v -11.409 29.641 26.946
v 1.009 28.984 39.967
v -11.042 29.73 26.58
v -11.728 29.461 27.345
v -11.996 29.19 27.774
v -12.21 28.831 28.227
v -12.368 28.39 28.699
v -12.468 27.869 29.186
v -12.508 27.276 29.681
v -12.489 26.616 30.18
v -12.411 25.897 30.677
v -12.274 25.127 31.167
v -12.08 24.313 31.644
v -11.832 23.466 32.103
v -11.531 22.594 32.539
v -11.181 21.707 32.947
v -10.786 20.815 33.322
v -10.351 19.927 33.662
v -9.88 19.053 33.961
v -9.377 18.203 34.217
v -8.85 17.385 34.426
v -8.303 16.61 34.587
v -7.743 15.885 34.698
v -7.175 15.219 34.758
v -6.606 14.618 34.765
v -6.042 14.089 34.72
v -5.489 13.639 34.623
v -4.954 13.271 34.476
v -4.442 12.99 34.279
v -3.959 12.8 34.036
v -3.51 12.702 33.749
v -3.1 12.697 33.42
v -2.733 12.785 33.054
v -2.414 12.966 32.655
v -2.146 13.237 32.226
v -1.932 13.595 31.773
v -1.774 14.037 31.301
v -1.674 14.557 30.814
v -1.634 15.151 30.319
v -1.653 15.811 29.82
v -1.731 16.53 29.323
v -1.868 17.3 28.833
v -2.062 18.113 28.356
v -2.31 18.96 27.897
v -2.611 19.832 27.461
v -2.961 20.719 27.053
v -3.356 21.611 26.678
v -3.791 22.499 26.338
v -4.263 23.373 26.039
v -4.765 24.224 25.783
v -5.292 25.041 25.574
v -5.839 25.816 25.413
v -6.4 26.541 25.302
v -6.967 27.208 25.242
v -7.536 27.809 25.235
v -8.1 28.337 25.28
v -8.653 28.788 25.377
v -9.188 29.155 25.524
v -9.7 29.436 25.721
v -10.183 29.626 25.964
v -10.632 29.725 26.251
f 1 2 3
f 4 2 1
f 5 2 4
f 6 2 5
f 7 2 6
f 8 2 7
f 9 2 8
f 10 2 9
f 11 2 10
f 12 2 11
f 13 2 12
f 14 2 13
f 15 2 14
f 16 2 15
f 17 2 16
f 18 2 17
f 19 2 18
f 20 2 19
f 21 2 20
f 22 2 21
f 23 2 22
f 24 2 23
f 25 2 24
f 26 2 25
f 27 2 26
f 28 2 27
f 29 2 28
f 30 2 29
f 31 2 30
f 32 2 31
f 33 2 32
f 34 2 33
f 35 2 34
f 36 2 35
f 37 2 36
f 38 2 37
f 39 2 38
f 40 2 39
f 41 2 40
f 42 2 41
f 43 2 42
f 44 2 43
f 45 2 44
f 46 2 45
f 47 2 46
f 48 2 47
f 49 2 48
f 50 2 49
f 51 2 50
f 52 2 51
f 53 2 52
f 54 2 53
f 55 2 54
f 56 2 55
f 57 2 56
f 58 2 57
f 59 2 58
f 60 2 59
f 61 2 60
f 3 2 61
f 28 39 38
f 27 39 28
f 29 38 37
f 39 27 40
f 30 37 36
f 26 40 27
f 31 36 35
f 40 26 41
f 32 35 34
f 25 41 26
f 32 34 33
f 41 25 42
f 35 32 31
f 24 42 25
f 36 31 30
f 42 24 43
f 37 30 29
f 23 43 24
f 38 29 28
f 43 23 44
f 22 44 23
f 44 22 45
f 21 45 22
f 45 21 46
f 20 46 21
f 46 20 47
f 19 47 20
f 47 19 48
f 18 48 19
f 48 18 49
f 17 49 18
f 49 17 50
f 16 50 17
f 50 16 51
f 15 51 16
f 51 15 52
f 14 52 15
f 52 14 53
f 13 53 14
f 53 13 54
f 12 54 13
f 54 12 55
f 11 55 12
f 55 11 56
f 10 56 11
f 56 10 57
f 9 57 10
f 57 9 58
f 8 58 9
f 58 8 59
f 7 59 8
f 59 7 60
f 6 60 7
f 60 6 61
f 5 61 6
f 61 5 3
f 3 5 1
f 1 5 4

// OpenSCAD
// file: ../utils/core/clip.scad
//
// NopSCADlib Copyright Chris Palmer 2018
// nop.head@gmail.com
// hydraraptor.blogspot.com
//
// This file is part of NopSCADlib.
//
// NopSCADlib is free software: you can redistribute it and/or modify it under the terms of the
// GNU General Public License as published by the Free Software Foundation, either version 3 of
// the License, or (at your option) any later version.
//
// NopSCADlib is distributed in the hope that it will be useful, but WITHOUT ANY WARRANTY;
// without even the implied warranty of MERCHANTABILITY or FITNESS FOR A PARTICULAR PURPOSE.
// See the GNU General Public License for more details.
//
// You should have received a copy of the GNU General Public License along with NopSCADlib.
// If not, see <https://www.gnu.org/licenses/>.
//

//
//! Construct arbirarily large box to partition 3D space and clip objects, useful for creating cross sections to see the inside when debugging.
//!
//! Original version by Doug Moen on the OpenSCAD forum
//
//
module box(xmin, ymin, zmin, xmax, ymax, zmax) //! Construct a box given its bounds
    polyhedron(
        [[xmin, ymin, zmin],  // 0
         [xmin, ymin, zmax],  // 1
         [xmin, ymax, zmin],  // 2
         [xmin, ymax, zmax],  // 3
         [xmax, ymin, zmin],  // 4
         [xmax, ymin, zmax],  // 5
         [xmax, ymax, zmin],  // 6
         [xmax, ymax, zmax]], // 7
        [[7,5,1,3],  // top
         [2,0,4,6],  // bottom
         [5,4,0,1],  // front
         [3,2,6,7],  // back
         [5,7,6,4],  // right
         [0,2,3,1]]  // left
    );

module clip(xmin = -inf, ymin = -inf, zmin = -inf, xmax = inf, ymax = inf, zmax = inf) //! Clip child to specified boundaries
    render() intersection() {
        children();

        box(xmin, ymin, zmin, xmax, ymax, zmax);
    }
// file: ../utils/core/rounded_rectangle.scad
//
// NopSCADlib Copyright Chris Palmer 2018
// nop.head@gmail.com
// hydraraptor.blogspot.com
//
// This file is part of NopSCADlib.
//
// NopSCADlib is free software: you can redistribute it and/or modify it under the terms of the
// GNU General Public License as published by the Free Software Foundation, either version 3 of
// the License, or (at your option) any later version.
//
// NopSCADlib is distributed in the hope that it will be useful, but WITHOUT ANY WARRANTY;
// without even the implied warranty of MERCHANTABILITY or FITNESS FOR A PARTICULAR PURPOSE.
// See the GNU General Public License for more details.
//
// You should have received a copy of the GNU General Public License along with NopSCADlib.
// If not, see <https://www.gnu.org/licenses/>.
//

//
//! Rectangle with rounded corners.
//
module rounded_square(size, r, center = true) //! Like ```square()``` but with with rounded corners
{
    $fn = r2sides4n(r);
    offset(r) offset(-r) square(size, center = center);
}

module rounded_rectangle(size, r, center = true, xy_center = true) //! Like ```cube()``` but corners rounded in XY plane and separate centre options for xy and z.
{
    linear_extrude(height = size[2], center = center)
        rounded_square([size[0], size[1]], r, xy_center);
}
// file: ../utils/core/teardrops.scad
//
// NopSCADlib Copyright Chris Palmer 2018
// nop.head@gmail.com
// hydraraptor.blogspot.com
//
// This file is part of NopSCADlib.
//
// NopSCADlib is free software: you can redistribute it and/or modify it under the terms of the
// GNU General Public License as published by the Free Software Foundation, either version 3 of
// the License, or (at your option) any later version.
//
// NopSCADlib is distributed in the hope that it will be useful, but WITHOUT ANY WARRANTY;
// without even the implied warranty of MERCHANTABILITY or FITNESS FOR A PARTICULAR PURPOSE.
// See the GNU General Public License for more details.
//
// You should have received a copy of the GNU General Public License along with NopSCADlib.
// If not, see <https://www.gnu.org/licenses/>.
//

//
//! For making horizontal holes that don't need support material.
//! Small holes can get away without it, but they print better with truncated teardrops.
//
module teardrop(h, r, center = true, truncate = true) //! For making horizontal holes that don't need support material, set ```truncate = false``` to make traditional RepRap teardrops that don't even need bridging
    render(convexity = 5)
        extrude_if(h, center)
           hull() {
                circle4n(r);

                if(truncate)
                    translate([0, r / 2])
                        square([2 * r * (sqrt(2) - 1), r], center = true);
                else
                    polygon([[0, 0], [eps, 0], [0, r * sqrt(2)]]);
            }

module semi_teardrop(h, r, d = undef, center = true) //! A semi teardrop in the positive Y domain
    render(convexity = 5)
        extrude_if(h, center)
            intersection() {
                R = is_undef(d) ? r : d / 2;
                teardrop(r = R, h = 0);

                sq = R + 1;
                translate([-sq, 0])
                    square([2 * sq, sq]);
            }

module teardrop_plus(h, r, center = true, truncate = true) //! Slightly bigger teardrop to allow for the 3D printing staircase effect
    teardrop(h, r + layer_height / 4, center, truncate);

module tearslot(h, r, w, center = true) //! A horizontal slot that doesn't need support material
    extrude_if(h, center)
        hull() {
            translate([-w/2,0,0]) teardrop(r = r, h = 0);
            translate([ w/2,0,0]) teardrop(r = r, h = 0);
        }

module vertical_tearslot(h, r, l, center = true) //! A vertical slot that doesn't need support material
    extrude_if(h, center)
        hull() {
            translate([0,  l / 2]) teardrop(0, r, true);
            translate([0, -l / 2])
                circle4n(r);
        }
// file: ../utils/core/polyholes.scad
//
// NopSCADlib Copyright Chris Palmer 2018
// nop.head@gmail.com
// hydraraptor.blogspot.com
//
// This file is part of NopSCADlib.
//
// NopSCADlib is free software: you can redistribute it and/or modify it under the terms of the
// GNU General Public License as published by the Free Software Foundation, either version 3 of
// the License, or (at your option) any later version.
//
// NopSCADlib is distributed in the hope that it will be useful, but WITHOUT ANY WARRANTY;
// without even the implied warranty of MERCHANTABILITY or FITNESS FOR A PARTICULAR PURPOSE.
// See the GNU General Public License for more details.
//
// You should have received a copy of the GNU General Public License along with NopSCADlib.
// If not, see <https://www.gnu.org/licenses/>.
//

//
//! A method of making 3D printed holes come out the right size regardless of the printer, providing
//! it gets the linear dimensions right. See <https://hydraraptor.blogspot.com/2011/02/polyholes.html>
//!
//! The module provides `poly_circle()`, `poly_cylinder()` and `poly_ring()` that is useful for making printed washers and pillars.
//
function sides(r) = max(round(4 * r), 3);                                       //! Optimium number of sides for specified radius
function corrected_radius(r, n = 0)   = r / cos(180 / (n ? n : sides(r)));      //! Adjusted radius to make flats lie on the circle
function corrected_diameter(d, n = 0) = d / cos(180 / (n ? n : sides(d / 2)));  //! Adjusted diameter to make flats lie on the circle

module poly_circle(r, sides = 0) { //! Make a circle adjusted to print the correct size
    n = sides ? sides : sides(r);
    circle(r = corrected_radius(r,n), $fn = n);
}

module poly_cylinder(r, h, center = false, sides = 0) //! Make a cylinder adjusted to print the correct size
    extrude_if(h, center)
        poly_circle(r, sides);

module poly_ring(or, ir) { //! Make a 2D ring adjusted to have the correct internal radius
    cir = corrected_radius(ir);
    filaments = (or - cir) / extrusion_width;
    if(filaments > 3 + eps)
        difference() {
            circle(or);

            poly_circle(ir);
        }
    else
        if(filaments >= 2)
            difference() {
                offset(or - cir)
                    poly_circle(ir);

                poly_circle(ir);
            }
            else
                difference() {
                    poly_circle(or);

                    offset(-squeezed_wall)
                        poly_circle(or);
                }
}

module poly_tube(or, ir, h, center = false) //! Make a tube adjusted to have the correct internal radius
    extrude_if(h, center)
        poly_ring(or, ir);

module drill(r, h = 100) //! Make a cylinder for drilling holes suitable for CNC routing, set h = 0 for circle
    extrude_if(h)
        circle(r = corrected_radius(r, r2sides(r)));
//
// Horizontal slot
//
module slot(r, l, h = 100) //! Make a horizontal slot suitable for CNC routing, set h = 0 for 2D version
    extrude_if(h)
        hull() {
            translate([l / 2,0])
                drill(r, 0);

            translate([-l / 2,0])
                drill(r, 0);
        }
// file: ../utils/core/bom.scad
//
// NopSCADlib Copyright Chris Palmer 2018
// nop.head@gmail.com
// hydraraptor.blogspot.com
//
// This file is part of NopSCADlib.
//
// NopSCADlib is free software: you can redistribute it and/or modify it under the terms of the
// GNU General Public License as published by the Free Software Foundation, either version 3 of
// the License, or (at your option) any later version.
//
// NopSCADlib is distributed in the hope that it will be useful, but WITHOUT ANY WARRANTY;
// without even the implied warranty of MERCHANTABILITY or FITNESS FOR A PARTICULAR PURPOSE.
// See the GNU General Public License for more details.
//
// You should have received a copy of the GNU General Public License along with NopSCADlib.
// If not, see <https://www.gnu.org/licenses/>.
//

//
//! Bill Of Materials generation via echo and the ```bom.py``` script. Also handles exploded assembly views and posing. Assembly instructions can precede the module
//! definition that makes the assembly.
//!
//! The example below shows how to define a vitamin and incorporate it into an assembly with sub-assemblies and make an exploded view. The resulting flat BOM is shown but
//! heirachical BOMs are also generated for real projects.
//
function bom_mode(n = 1) = $_bom >= n && (is_undef($on_bom) || $on_bom);  //! Current BOM mode, 0 = none, 1 = printed and routed parts and assemblies, 2 includes vitamins as well
function exploded() = is_undef($exploded_parent) ? $exploded : 0;   //! Returns the value of ```$exploded``` if it is defined, else ```0```
function show_supports() = !$preview || exploded();                 //! True if printed support material should be shown

module no_explode() let($exploded_parent = true) children();        //! Prevent children being exploded
module no_pose() let($posed = true) children();                     //! Force children not to be posed even if parent is

module explode(d, explode_children = false, offset = [0,0,0]) {     //! Explode children by specified Z distance or vector ```d```, option to explode grand children
    v = is_list(d) ? d : [0, 0, d];
    o = is_list(offset) ? offset : [0, 0, offset];
    if($exploded && is_undef($exploded_parent) && norm(v)) {
        translate(o)                                                // Draw the line first in case the child is transparent
            color("yellow") hull() {
                sphere(0.2);

                translate(v * $exploded)
                    sphere(0.2);
            }

        translate(v * $exploded)
            let($exploded_parent = explode_children ? undef : true)
                children();
    }
    else
        children();
}

module pose(a = [55, 0, 25], t = [0, 0, 0], exploded = undef)       //! Pose an STL or assembly for rendering to png by specifying rotation ```a``` and translation ```t```, ```exploded = true for``` just the exploded view or ```false``` for unexploded only.
    if(is_undef($pose) || !is_undef($posed) || (!is_undef(exploded) && exploded != !!exploded()))
        children();
    else
        let($posed = true) // only pose the top level
            rotate([55, 0, 25])
                rotate([-a.x, 0, 0])
                    rotate([0, -a.y, 0])
                        rotate([0, 0, -a.z])
                            translate(-t)
                                children();

module pose_hflip(exploded = undef)       //! Pose an STL or assembly for rendering to png by flipping around the Y axis, ```exploded = true for``` just the exploded view or ```false``` for unexploded only.
    if(is_undef($pose) || !is_undef($posed) || (!is_undef(exploded) && exploded != !!exploded()))
        children();
    else
        let($posed = true) // only pose the top level
            hflip()
                children();

module pose_vflip(exploded = undef)       //! Pose an STL or assembly for rendering to png by flipping around the X axis, ```exploded = true for``` just the exploded view or ```false``` for unexploded only.
    if(is_undef($pose) || !is_undef($posed) || (!is_undef(exploded) && exploded != !!exploded()))
        children();
    else
        let($posed = true) // only pose the top level
            vflip()
                children();


module assembly(name) {                 //! Name an assembly that will appear on the BOM, there needs to a module named ```<name>_assembly``` to make it
    if(bom_mode())
        echo(str("~", name, "_assembly{"));

    no_pose()
        if(is_undef($child_assembly))
            let($child_assembly = true)
                children();
        else
            no_explode()
                children();

    if(bom_mode())
        echo(str("~}", name, "_assembly"));
}

module stl(name) {                      //! Name an stl that will appear on the BOM, there needs to a module named ```<name>_stl``` to make it
    if(bom_mode())
        echo(str("~", name, ".stl"));
}

module dxf(name) {                      //! Name a dxf that will appear on the BOM, there needs to a module named ```<name>_dxf``` to make it
    if(bom_mode())
        echo(str("~", name, ".dxf"));
}

function value_string(value) = is_string(value) ? str("\"", value, "\"") : str(value); //! Convert ```value``` to a string or quote it if it is already a string

function arg(value, default, name = "") =   //! Create string for arg if not default, helper for ```vitamin()```
    value == default ? ""
                     : name ? str(", ", name, " = ", value_string(value))
                            : str(", ", value_string(value));

module vitamin(description) {                //! Describe a vitamin for the BOM entry and precede it with a module call that creates it, eg. "wigit(42): Type 42 widget"
    if(bom_mode(2))
        echo(str("~", description, !is_undef($hidden) ? " - not shown" : ""));
}

module not_on_bom(on = false)               //! Specify the following child parts are not on the BOM, for example when they are on a PCB that comes assembled
    let($on_bom = on)
        children();

module hidden()                             //! Make item invisible, except on the BOM
    scale(1 / sqr(1024))
        let($hidden = true)
            children();
// file: ../utils/core/sphere.scad
//
// NopSCADlib Copyright Chris Palmer 2018
// nop.head@gmail.com
// hydraraptor.blogspot.com
//
// This file is part of NopSCADlib.
//
// NopSCADlib is free software: you can redistribute it and/or modify it under the terms of the
// GNU General Public License as published by the Free Software Foundation, either version 3 of
// the License, or (at your option) any later version.
//
// NopSCADlib is distributed in the hope that it will be useful, but WITHOUT ANY WARRANTY;
// without even the implied warranty of MERCHANTABILITY or FITNESS FOR A PARTICULAR PURPOSE.
// See the GNU General Public License for more details.
//
// You should have received a copy of the GNU General Public License along with NopSCADlib.
// If not, see <https://www.gnu.org/licenses/>.
//

//! Redefines `sphere()` to always have a vertex on all six half axes I.e. vertices at the poles and the equator and `$fn` a multiple of four.
//! This ensures `hull` and `minkowski` results have the correct dimensions when spheres are placed at the corners.

module sphere(r = 1, d = undef) {                   //! Override ```sphere``` so that has vertices on all three axes. Has the advantage of giving correct dimensions when hulled
    R = is_undef(d) ? r : d / 2;
    rotate_extrude($fn = r2sides4n(R))
        rotate(-90)
            semi_circle(R);
}
// file: ../utils/core/global.scad
//
// NopSCADlib Copyright Chris Palmer 2018
// nop.head@gmail.com
// hydraraptor.blogspot.com
//
// This file is part of NopSCADlib.
//
// NopSCADlib is free software: you can redistribute it and/or modify it under the terms of the
// GNU General Public License as published by the Free Software Foundation, either version 3 of
// the License, or (at your option) any later version.
//
// NopSCADlib is distributed in the hope that it will be useful, but WITHOUT ANY WARRANTY;
// without even the implied warranty of MERCHANTABILITY or FITNESS FOR A PARTICULAR PURPOSE.
// See the GNU General Public License for more details.
//
// You should have received a copy of the GNU General Public License along with NopSCADlib.
// If not, see <https://www.gnu.org/licenses/>.
//

//
//! Global constants, functions and modules. This file is used directly or indirectly in every scad file.
//
include <../../global_defs.scad>

function inch(x) = x * 25.4;                                                        //! Inch to mm conversion (For fractional inches, 'inch(1 + 7/8)' will work as expected.)
function foot(x) = x * 25.4 * 12;                                                   //! Foot to mm conversion
function yard(x) = x * 25.4 * 12 * 3;                                               //! Yard to mm conversion
function mm(x)   = x;                                                               //! Explicit mm specified
function cm(x)   = x * 10.0;                                                        //! cm to mm conversion
function m(x)    = x * 1000.0;                                                      //! m to mm conversion

function sqr(x) = x * x;                                                            //! Returns the square of ```x```
function echoit(x) = echo(x) x;                                                     //! Echo expression and return it, useful for debugging
function in(list, x) = !!len([for(v = list) if(v == x) true]);                      //! Returns true if ```x``` is an element in the ```list```
function Len(x) = is_list(x) ? len(x) : 0;                                          //! Returns the length of a list or 0 if ```x``` is not a list
function r2sides(r) = $fn ? $fn : ceil(max(min(360/ $fa, r * 2 * PI / $fs), 5));    //! Replicates the OpenSCAD logic to calculate the number of sides from the radius
function r2sides4n(r) = floor((r2sides(r) + 3) / 4) * 4;                            //! Round up the number of sides to a multiple of 4 to ensure points land on all axes

module translate_z(z) translate([0, 0, z]) children();                              //! Shortcut for Z only translations
module vflip() rotate([180, 0, 0]) children();                                      //! Invert children by doing a 180&deg; flip around the X axis
module hflip() rotate([0, 180, 0]) children();                                      //! Invert children by doing a 180&deg; flip around the Y axis
module ellipse(xr, yr) scale([1, yr / xr]) circle4n(xr);                            //! Draw an ellipse

module extrude_if(h, center = true)                 //! Extrudes 2D object to 3D when ```h``` is nonzero, otherwise leaves it 2D
    if(h)
        linear_extrude(height = h, center = center, convexity = 2) // 3D
            children();
    else
        children();                                 // 2D

module circle4n(r, d = undef) {                     //! Circle with multiple of 4 vertices
    R = is_undef(d) ? r : d / 2;
    circle(R, $fn = r2sides4n(R));
}

module semi_circle(r, d = undef)                    //! A semi circle in the positive Y domain
    intersection() {
        R = is_undef(d) ? r : d / 2;
        circle4n(R);

        sq = R + 1;
        translate([-sq, 0])
            square([2 * sq, sq]);
    }

module right_triangle(width, height, h, center = true) //! A right angled triangle with the 90&deg; corner at the origin. 3D when ```h``` is nonzero, otherwise 2D
    extrude_if(h, center = center)
        polygon(points = [[0,0], [width, 0], [0, height]]);

include <sphere.scad>
include <bom.scad>
include <polyholes.scad>
include <teardrops.scad>
include <rounded_rectangle.scad>
include <clip.scad>
// file: ../global_defs.scad
//
// NopSCADlib Copyright Chris Palmer 2018
// nop.head@gmail.com
// hydraraptor.blogspot.com
//
// This file is part of NopSCADlib.
//
// NopSCADlib is free software: you can redistribute it and/or modify it under the terms of the
// GNU General Public License as published by the Free Software Foundation, either version 3 of
// the License, or (at your option) any later version.
//
// NopSCADlib is distributed in the hope that it will be useful, but WITHOUT ANY WARRANTY;
// without even the implied warranty of MERCHANTABILITY or FITNESS FOR A PARTICULAR PURPOSE.
// See the GNU General Public License for more details.
//
// You should have received a copy of the GNU General Public License along with NopSCADlib.
// If not, see <https://www.gnu.org/licenses/>.
//

//
// This file included directly or indirectly in every scad file.
//
// This scheme allows the following:
//  bom defaults to 0
//  Setting $bom on the command line or in the main file before including lib.scad overrides it everywhere.
//  Setting $bom after including lib overrides bom in the libs but not in the local file.
//  Setting $_bom in the local file overrides it in the local file but not in the libs.
//
//function is_undef(x) = x == undef;

$_bom           = is_undef($bom)             ? 0      : $bom;             // 0 no bom, 1 assemblies and stls, 2 vitamins as well
$exploded       = is_undef($explode)         ? 0      : $explode;         // 1 for exploded view
layer_height    = is_undef($layer_height)    ? 0.25   : $layer_height;    // layer heigth when printing
extrusion_width = is_undef($extrusion_width) ? 0.5    : $extrusion_width; // filament width when printing
nozzle          = is_undef($nozzle)          ? 0.45   : $nozzle;          // 3D printer nozzle
cnc_bit_r       = is_undef($cnc_bit_r)       ? 1.2    : $cnc_bit_r;       // miniumum tool radius when milling 2D objects
pp1_colour      = is_undef($pp1_colour)      ? "lime" : $pp1_colour;      // printed part colour 1
pp2_colour      = is_undef($pp2_colour)      ? "red"  : $pp2_colour;      // printed part colour 2
pp3_colour      = is_undef($pp3_colour)      ? "blue" : $pp3_colour;      // printed part colour 3
pp4_colour      = is_undef($pp4_colour)      ? "darkorange" : $pp4_colour;// printed part colour 4
show_rays       = is_undef($show_rays)       ? false  : $show_rays;       // show camera sight lines and light direction
show_threads    = is_undef($show_threads)    ? false  : $show_threads;    // show screw threads

// Minimum wall is about two filaments wide but we extrude it closer to get better bonding
squeezed_wall = $preview ? 2 * extrusion_width - layer_height * (1 - PI / 4)
                         : extrusion_width - layer_height / 2 + nozzle / 2 + extrusion_width / 2;

inf = 1e10;      // very big
eps = 1/128;     // small fudge factor to stop CSG barfing on coincident faces.
$fa = 6;
$fs = extrusion_width / 2;

function round_to_layer(z) = ceil(z / layer_height) * layer_height;
// Some additional named colors
grey20                          = [0.2, 0.2, 0.2];
grey30                          = [0.3, 0.3, 0.3];
grey40                          = [0.4, 0.4, 0.4];
grey50                          = [0.5, 0.5, 0.5];
grey60                          = [0.6, 0.6, 0.6];
grey70                          = [0.7, 0.7, 0.7];
grey80                          = [0.8, 0.8, 0.8];
grey90                          = [0.9, 0.9, 0.9];
brass                           = [255/255, 215/255, 0/255];
silver                          = [0.75, 0.75, 0.75];

/*
 * Enums
 */
//
// Screws
//
hs_cap    = 0;
hs_pan    = 1;
hs_cs     = 2;     // counter sunk
hs_hex    = 3;
hs_grub   = 4;     // pulley set screw
hs_cs_cap = 5;
hs_dome   = 6;
//
// Hot end descriptions
//
jhead   = 1;
e3d     = 2;
//
// Face enumeration
//
f_bottom = 0;
f_top    = 1;
f_left   = 2;
f_right  = 3;
f_front  = 4;
f_back   = 5;
// file: ../utils/annotation.scad
//
// NopSCADlib Copyright Chris Palmer 2018
// nop.head@gmail.com
// hydraraptor.blogspot.com
//
// This file is part of NopSCADlib.
//
// NopSCADlib is free software: you can redistribute it and/or modify it under the terms of the
// GNU General Public License as published by the Free Software Foundation, either version 3 of
// the License, or (at your option) any later version.
//
// NopSCADlib is distributed in the hope that it will be useful, but WITHOUT ANY WARRANTY;
// without even the implied warranty of MERCHANTABILITY or FITNESS FOR A PARTICULAR PURPOSE.
// See the GNU General Public License for more details.
//
// You should have received a copy of the GNU General Public License along with NopSCADlib.
// If not, see <https://www.gnu.org/licenses/>.
//

//
//! Annotation used in this documentation
//

include <../core.scad>

module label(str, scale = 0.25, valign = "baseline", halign = "left") //! Draw text that always faces the camera
    color("black")
        %rotate($vpr != [0, 0, 0] ? $vpr : [70, 0, 315])
            linear_extrude(height = eps)
                scale(scale)
                    text(str, valign = valign, halign = halign);

module arrow(length = 20) { //! Draw an arrow that faces downwards
    d = length / 20;
    head_r = 1.5 * d;

    color("grey") %union() {
        translate_z(head_r)
            cylinder(d = d, h = length - head_r, $fn = 32);

        cylinder(r1 = 0, r2 = head_r, h = head_r);
    }
}
// file: ../utils/maths.scad
//
// NopSCADlib Copyright Chris Palmer 2018
// nop.head@gmail.com
// hydraraptor.blogspot.com
//
// This file is part of NopSCADlib.
//
// NopSCADlib is free software: you can redistribute it and/or modify it under the terms of the
// GNU General Public License as published by the Free Software Foundation, either version 3 of
// the License, or (at your option) any later version.
//
// NopSCADlib is distributed in the hope that it will be useful, but WITHOUT ANY WARRANTY;
// without even the implied warranty of MERCHANTABILITY or FITNESS FOR A PARTICULAR PURPOSE.
// See the GNU General Public License for more details.
//
// You should have received a copy of the GNU General Public License along with NopSCADlib.
// If not, see <https://www.gnu.org/licenses/>.
//

//
//! Maths utilities for manipulating vectors and matrices.
//
function sqr(x) = x * x;

function translate(v) = let(u = is_list(v) ? len(v) == 2 ? [v.x, v.y, 0] //! Generate a 4x4 translation matrix, ```v``` can be ```[x, y]```, ```[x, y, z]``` or ```z```
                                                         : v
                                           : [0, 0, v])
                          [ [1, 0, 0, u.x],
                            [0, 1, 0, u.y],
                            [0, 0, 1, u.z],
                            [0, 0, 0,   1] ];

function rotate(a, v) = //! Generate a 4x4 rotation matrix, ```a``` can be a vector of three angles or a single angle around ```z```, or around axis ```v```
    is_undef(v) ? let(av = is_list(a) ? a : [0, 0, a],
                      cx = cos(av[0]),
                      cy = cos(av[1]),
                      cz = cos(av[2]),
                      sx = sin(av[0]),
                      sy = sin(av[1]),
                      sz = sin(av[2]))
                          [
                              [ cy * cz, sx * sy * cz - cx * sz, cx * sy * cz + sx * sz, 0],
                              [ cy * sz, sx * sy * sz + cx * cz, cx * sy * sz - sx * cz, 0],
                              [-sy,      sx * cy,                cx * cy,                0],
                              [ 0,       0,                      0,                      1]
                          ]
                : let(s = sin(a),
                      c = cos(a),
                      C = 1 - c,
                      m = sqr(v.x) + sqr(v.y) + sqr(v.z), // m used instead of norm to avoid irrational roots as much as possible
                      u = v / sqrt(m))
                          [
                              [ C * v.x * v.x / m + c,       C * v.x * v.y / m - u.z * s, C * v.x * v.z / m + u.y * s, 0],
                              [ C * v.y * v.x / m + u.z * s, C * v.y * v.y / m + c,       C * v.y * v.z / m - u.x * s, 0],
                              [ C * v.z * v.x / m - u.y * s, C * v.z * v.y / m + u.x * s, C * v.z * v.z / m + c,       0],
                              [ 0,                           0,                           0,                           1]
                         ];

function scale(v) = let(s = is_list(v) ? v : [v, v, v]) //!  Generate a 4x4 matrix that scales by ```v```, which can be a vector of xyz factors or a scalar to scale all axes equally
                        [
                          [s.x, 0,   0,   0],
                          [0,   s.y, 0,   0],
                          [0,   0,   s.z, 0],
                          [0,   0,   0,   1]
                        ];

function vec3(v) = [v.x, v.y, v.z]; //! Return a 3 vector with the first three elements of ```v```
function vec4(v) = [v.x, v.y, v.z, 1]; //! Return a 4 vector with the first three elements of ```v```
function transform(v, m) = vec3(m * [v.x, v.y, v.z, 1]); //! Apply 4x4 transform to a 3 vector by extending it and cropping it again
function transform_points(path, m) = [for(p = path) transform(p, m)]; //! Apply transform to a path
function unit(v) = let(n = norm(v)) n ? v / n : v; //! Convert ```v``` to a unit vector

function transpose(m) = [ for(j = [0 : len(m[0]) - 1]) [ for(i = [0 : len(m) - 1]) m[i][j] ] ]; //! Transpose an arbitrary size matrix

function identity(n, x = 1) = [for(i = [0 : n - 1]) [for(j = [0 : n - 1]) i == j ? x : 0] ]; //! Construct an arbitrary size identity matrix

function reverse(v) = let(n = len(v) - 1) n < 0 ? [] : [for(i = [0 : n]) v[n - i]]; //! Reverse a vector

function angle_between(v1, v2) = acos(v1 * v2 / (norm(v1) * norm(v2))); //! Return the angle between two vectors

// https://www.gregslabaugh.net/publications/euler.pdf
function euler(R) = let(ay = asin(-R[2][0]), cy = cos(ay)) //! Convert a rotation matrix to a Euler rotation vector.
    cy ? [ atan2(R[2][1] / cy, R[2][2] / cy), ay, atan2(R[1][0] / cy, R[0][0] / cy) ]
       : R[2][0] < 0 ? [atan2( R[0][1],  R[0][2]),  180, 0]
                     : [atan2(-R[0][1], -R[0][2]), -180, 0];
// file: ../core.scad
//
// NopSCADlib Copyright Chris Palmer 2018
// nop.head@gmail.com
// hydraraptor.blogspot.com
//
// This file is part of NopSCADlib.
//
// NopSCADlib is free software: you can redistribute it and/or modify it under the terms of the
// GNU General Public License as published by the Free Software Foundation, either version 3 of
// the License, or (at your option) any later version.
//
// NopSCADlib is distributed in the hope that it will be useful, but WITHOUT ANY WARRANTY;
// without even the implied warranty of MERCHANTABILITY or FITNESS FOR A PARTICULAR PURPOSE.
// See the GNU General Public License for more details.
//
// You should have received a copy of the GNU General Public License along with NopSCADlib.
// If not, see <https://www.gnu.org/licenses/>.
//

//
// Include this file to use the miniumum library
//
include <global_defs.scad>
//
// Global functions and modules
//
use <utils/core/global.scad>

module use_stl(name) {               //! Import an STL to make a build platter
    stl(name);

    import(str("../stls/", name, ".stl"));
}

module use_dxf(name) {               //! Import a DXF to make a build panel
    dxf(name);

    import(str("../dxfs/", name, ".dxf"));
}
// main file
//
// NopSCADlib Copyright Chris Palmer 2018
// nop.head@gmail.com
// hydraraptor.blogspot.com
//
// This file is part of NopSCADlib.
//
// NopSCADlib is free software: you can redistribute it and/or modify it under the terms of the
// GNU General Public License as published by the Free Software Foundation, either version 3 of
// the License, or (at your option) any later version.
//
// NopSCADlib is distributed in the hope that it will be useful, but WITHOUT ANY WARRANTY;
// without even the implied warranty of MERCHANTABILITY or FITNESS FOR A PARTICULAR PURPOSE.
// See the GNU General Public License for more details.
//
// You should have received a copy of the GNU General Public License along with NopSCADlib.
// If not, see <https://www.gnu.org/licenses/>.
//
include <../core.scad>
use <../utils/maths.scad>
use <../utils/annotation.scad>

tip = [0, 0, 20];

module shape() {
    cylinder(d1 = 20, d2 = 0, h = tip.z);
}

t = [10, 20, 30];
r = [45, 20, 70];
s = [1, 0.5, 0.75];

module maths() {
    //
    // Translate, rotate and scale the shape
    //
    translate(t)
        rotate(r)
            scale(s)
                shape();
    //
    // Apply the same transformations to the vector position of the tip
    //
    p = transform(tip, translate(t) * rotate(r) * scale(s));
    //
    // Place an arrow where the tip ends up
    //
    translate(p)
        arrow();
    //
    // Unit vector pointing at p
    //
    u = unit(p);
    //
    // Point arrow in same direction
    //
    z = [0, 0, 1];
    v = cross(u, z);
    a = angle_between(u, z);


    l = 20;
    rotate(-a, v)
        translate_z(l)
            vflip()
                arrow(l);

    //
    // Test Euler
    //
    assert(euler(rotate(r)) == r, "euler() failed");
}

rotate(45)
    maths();
